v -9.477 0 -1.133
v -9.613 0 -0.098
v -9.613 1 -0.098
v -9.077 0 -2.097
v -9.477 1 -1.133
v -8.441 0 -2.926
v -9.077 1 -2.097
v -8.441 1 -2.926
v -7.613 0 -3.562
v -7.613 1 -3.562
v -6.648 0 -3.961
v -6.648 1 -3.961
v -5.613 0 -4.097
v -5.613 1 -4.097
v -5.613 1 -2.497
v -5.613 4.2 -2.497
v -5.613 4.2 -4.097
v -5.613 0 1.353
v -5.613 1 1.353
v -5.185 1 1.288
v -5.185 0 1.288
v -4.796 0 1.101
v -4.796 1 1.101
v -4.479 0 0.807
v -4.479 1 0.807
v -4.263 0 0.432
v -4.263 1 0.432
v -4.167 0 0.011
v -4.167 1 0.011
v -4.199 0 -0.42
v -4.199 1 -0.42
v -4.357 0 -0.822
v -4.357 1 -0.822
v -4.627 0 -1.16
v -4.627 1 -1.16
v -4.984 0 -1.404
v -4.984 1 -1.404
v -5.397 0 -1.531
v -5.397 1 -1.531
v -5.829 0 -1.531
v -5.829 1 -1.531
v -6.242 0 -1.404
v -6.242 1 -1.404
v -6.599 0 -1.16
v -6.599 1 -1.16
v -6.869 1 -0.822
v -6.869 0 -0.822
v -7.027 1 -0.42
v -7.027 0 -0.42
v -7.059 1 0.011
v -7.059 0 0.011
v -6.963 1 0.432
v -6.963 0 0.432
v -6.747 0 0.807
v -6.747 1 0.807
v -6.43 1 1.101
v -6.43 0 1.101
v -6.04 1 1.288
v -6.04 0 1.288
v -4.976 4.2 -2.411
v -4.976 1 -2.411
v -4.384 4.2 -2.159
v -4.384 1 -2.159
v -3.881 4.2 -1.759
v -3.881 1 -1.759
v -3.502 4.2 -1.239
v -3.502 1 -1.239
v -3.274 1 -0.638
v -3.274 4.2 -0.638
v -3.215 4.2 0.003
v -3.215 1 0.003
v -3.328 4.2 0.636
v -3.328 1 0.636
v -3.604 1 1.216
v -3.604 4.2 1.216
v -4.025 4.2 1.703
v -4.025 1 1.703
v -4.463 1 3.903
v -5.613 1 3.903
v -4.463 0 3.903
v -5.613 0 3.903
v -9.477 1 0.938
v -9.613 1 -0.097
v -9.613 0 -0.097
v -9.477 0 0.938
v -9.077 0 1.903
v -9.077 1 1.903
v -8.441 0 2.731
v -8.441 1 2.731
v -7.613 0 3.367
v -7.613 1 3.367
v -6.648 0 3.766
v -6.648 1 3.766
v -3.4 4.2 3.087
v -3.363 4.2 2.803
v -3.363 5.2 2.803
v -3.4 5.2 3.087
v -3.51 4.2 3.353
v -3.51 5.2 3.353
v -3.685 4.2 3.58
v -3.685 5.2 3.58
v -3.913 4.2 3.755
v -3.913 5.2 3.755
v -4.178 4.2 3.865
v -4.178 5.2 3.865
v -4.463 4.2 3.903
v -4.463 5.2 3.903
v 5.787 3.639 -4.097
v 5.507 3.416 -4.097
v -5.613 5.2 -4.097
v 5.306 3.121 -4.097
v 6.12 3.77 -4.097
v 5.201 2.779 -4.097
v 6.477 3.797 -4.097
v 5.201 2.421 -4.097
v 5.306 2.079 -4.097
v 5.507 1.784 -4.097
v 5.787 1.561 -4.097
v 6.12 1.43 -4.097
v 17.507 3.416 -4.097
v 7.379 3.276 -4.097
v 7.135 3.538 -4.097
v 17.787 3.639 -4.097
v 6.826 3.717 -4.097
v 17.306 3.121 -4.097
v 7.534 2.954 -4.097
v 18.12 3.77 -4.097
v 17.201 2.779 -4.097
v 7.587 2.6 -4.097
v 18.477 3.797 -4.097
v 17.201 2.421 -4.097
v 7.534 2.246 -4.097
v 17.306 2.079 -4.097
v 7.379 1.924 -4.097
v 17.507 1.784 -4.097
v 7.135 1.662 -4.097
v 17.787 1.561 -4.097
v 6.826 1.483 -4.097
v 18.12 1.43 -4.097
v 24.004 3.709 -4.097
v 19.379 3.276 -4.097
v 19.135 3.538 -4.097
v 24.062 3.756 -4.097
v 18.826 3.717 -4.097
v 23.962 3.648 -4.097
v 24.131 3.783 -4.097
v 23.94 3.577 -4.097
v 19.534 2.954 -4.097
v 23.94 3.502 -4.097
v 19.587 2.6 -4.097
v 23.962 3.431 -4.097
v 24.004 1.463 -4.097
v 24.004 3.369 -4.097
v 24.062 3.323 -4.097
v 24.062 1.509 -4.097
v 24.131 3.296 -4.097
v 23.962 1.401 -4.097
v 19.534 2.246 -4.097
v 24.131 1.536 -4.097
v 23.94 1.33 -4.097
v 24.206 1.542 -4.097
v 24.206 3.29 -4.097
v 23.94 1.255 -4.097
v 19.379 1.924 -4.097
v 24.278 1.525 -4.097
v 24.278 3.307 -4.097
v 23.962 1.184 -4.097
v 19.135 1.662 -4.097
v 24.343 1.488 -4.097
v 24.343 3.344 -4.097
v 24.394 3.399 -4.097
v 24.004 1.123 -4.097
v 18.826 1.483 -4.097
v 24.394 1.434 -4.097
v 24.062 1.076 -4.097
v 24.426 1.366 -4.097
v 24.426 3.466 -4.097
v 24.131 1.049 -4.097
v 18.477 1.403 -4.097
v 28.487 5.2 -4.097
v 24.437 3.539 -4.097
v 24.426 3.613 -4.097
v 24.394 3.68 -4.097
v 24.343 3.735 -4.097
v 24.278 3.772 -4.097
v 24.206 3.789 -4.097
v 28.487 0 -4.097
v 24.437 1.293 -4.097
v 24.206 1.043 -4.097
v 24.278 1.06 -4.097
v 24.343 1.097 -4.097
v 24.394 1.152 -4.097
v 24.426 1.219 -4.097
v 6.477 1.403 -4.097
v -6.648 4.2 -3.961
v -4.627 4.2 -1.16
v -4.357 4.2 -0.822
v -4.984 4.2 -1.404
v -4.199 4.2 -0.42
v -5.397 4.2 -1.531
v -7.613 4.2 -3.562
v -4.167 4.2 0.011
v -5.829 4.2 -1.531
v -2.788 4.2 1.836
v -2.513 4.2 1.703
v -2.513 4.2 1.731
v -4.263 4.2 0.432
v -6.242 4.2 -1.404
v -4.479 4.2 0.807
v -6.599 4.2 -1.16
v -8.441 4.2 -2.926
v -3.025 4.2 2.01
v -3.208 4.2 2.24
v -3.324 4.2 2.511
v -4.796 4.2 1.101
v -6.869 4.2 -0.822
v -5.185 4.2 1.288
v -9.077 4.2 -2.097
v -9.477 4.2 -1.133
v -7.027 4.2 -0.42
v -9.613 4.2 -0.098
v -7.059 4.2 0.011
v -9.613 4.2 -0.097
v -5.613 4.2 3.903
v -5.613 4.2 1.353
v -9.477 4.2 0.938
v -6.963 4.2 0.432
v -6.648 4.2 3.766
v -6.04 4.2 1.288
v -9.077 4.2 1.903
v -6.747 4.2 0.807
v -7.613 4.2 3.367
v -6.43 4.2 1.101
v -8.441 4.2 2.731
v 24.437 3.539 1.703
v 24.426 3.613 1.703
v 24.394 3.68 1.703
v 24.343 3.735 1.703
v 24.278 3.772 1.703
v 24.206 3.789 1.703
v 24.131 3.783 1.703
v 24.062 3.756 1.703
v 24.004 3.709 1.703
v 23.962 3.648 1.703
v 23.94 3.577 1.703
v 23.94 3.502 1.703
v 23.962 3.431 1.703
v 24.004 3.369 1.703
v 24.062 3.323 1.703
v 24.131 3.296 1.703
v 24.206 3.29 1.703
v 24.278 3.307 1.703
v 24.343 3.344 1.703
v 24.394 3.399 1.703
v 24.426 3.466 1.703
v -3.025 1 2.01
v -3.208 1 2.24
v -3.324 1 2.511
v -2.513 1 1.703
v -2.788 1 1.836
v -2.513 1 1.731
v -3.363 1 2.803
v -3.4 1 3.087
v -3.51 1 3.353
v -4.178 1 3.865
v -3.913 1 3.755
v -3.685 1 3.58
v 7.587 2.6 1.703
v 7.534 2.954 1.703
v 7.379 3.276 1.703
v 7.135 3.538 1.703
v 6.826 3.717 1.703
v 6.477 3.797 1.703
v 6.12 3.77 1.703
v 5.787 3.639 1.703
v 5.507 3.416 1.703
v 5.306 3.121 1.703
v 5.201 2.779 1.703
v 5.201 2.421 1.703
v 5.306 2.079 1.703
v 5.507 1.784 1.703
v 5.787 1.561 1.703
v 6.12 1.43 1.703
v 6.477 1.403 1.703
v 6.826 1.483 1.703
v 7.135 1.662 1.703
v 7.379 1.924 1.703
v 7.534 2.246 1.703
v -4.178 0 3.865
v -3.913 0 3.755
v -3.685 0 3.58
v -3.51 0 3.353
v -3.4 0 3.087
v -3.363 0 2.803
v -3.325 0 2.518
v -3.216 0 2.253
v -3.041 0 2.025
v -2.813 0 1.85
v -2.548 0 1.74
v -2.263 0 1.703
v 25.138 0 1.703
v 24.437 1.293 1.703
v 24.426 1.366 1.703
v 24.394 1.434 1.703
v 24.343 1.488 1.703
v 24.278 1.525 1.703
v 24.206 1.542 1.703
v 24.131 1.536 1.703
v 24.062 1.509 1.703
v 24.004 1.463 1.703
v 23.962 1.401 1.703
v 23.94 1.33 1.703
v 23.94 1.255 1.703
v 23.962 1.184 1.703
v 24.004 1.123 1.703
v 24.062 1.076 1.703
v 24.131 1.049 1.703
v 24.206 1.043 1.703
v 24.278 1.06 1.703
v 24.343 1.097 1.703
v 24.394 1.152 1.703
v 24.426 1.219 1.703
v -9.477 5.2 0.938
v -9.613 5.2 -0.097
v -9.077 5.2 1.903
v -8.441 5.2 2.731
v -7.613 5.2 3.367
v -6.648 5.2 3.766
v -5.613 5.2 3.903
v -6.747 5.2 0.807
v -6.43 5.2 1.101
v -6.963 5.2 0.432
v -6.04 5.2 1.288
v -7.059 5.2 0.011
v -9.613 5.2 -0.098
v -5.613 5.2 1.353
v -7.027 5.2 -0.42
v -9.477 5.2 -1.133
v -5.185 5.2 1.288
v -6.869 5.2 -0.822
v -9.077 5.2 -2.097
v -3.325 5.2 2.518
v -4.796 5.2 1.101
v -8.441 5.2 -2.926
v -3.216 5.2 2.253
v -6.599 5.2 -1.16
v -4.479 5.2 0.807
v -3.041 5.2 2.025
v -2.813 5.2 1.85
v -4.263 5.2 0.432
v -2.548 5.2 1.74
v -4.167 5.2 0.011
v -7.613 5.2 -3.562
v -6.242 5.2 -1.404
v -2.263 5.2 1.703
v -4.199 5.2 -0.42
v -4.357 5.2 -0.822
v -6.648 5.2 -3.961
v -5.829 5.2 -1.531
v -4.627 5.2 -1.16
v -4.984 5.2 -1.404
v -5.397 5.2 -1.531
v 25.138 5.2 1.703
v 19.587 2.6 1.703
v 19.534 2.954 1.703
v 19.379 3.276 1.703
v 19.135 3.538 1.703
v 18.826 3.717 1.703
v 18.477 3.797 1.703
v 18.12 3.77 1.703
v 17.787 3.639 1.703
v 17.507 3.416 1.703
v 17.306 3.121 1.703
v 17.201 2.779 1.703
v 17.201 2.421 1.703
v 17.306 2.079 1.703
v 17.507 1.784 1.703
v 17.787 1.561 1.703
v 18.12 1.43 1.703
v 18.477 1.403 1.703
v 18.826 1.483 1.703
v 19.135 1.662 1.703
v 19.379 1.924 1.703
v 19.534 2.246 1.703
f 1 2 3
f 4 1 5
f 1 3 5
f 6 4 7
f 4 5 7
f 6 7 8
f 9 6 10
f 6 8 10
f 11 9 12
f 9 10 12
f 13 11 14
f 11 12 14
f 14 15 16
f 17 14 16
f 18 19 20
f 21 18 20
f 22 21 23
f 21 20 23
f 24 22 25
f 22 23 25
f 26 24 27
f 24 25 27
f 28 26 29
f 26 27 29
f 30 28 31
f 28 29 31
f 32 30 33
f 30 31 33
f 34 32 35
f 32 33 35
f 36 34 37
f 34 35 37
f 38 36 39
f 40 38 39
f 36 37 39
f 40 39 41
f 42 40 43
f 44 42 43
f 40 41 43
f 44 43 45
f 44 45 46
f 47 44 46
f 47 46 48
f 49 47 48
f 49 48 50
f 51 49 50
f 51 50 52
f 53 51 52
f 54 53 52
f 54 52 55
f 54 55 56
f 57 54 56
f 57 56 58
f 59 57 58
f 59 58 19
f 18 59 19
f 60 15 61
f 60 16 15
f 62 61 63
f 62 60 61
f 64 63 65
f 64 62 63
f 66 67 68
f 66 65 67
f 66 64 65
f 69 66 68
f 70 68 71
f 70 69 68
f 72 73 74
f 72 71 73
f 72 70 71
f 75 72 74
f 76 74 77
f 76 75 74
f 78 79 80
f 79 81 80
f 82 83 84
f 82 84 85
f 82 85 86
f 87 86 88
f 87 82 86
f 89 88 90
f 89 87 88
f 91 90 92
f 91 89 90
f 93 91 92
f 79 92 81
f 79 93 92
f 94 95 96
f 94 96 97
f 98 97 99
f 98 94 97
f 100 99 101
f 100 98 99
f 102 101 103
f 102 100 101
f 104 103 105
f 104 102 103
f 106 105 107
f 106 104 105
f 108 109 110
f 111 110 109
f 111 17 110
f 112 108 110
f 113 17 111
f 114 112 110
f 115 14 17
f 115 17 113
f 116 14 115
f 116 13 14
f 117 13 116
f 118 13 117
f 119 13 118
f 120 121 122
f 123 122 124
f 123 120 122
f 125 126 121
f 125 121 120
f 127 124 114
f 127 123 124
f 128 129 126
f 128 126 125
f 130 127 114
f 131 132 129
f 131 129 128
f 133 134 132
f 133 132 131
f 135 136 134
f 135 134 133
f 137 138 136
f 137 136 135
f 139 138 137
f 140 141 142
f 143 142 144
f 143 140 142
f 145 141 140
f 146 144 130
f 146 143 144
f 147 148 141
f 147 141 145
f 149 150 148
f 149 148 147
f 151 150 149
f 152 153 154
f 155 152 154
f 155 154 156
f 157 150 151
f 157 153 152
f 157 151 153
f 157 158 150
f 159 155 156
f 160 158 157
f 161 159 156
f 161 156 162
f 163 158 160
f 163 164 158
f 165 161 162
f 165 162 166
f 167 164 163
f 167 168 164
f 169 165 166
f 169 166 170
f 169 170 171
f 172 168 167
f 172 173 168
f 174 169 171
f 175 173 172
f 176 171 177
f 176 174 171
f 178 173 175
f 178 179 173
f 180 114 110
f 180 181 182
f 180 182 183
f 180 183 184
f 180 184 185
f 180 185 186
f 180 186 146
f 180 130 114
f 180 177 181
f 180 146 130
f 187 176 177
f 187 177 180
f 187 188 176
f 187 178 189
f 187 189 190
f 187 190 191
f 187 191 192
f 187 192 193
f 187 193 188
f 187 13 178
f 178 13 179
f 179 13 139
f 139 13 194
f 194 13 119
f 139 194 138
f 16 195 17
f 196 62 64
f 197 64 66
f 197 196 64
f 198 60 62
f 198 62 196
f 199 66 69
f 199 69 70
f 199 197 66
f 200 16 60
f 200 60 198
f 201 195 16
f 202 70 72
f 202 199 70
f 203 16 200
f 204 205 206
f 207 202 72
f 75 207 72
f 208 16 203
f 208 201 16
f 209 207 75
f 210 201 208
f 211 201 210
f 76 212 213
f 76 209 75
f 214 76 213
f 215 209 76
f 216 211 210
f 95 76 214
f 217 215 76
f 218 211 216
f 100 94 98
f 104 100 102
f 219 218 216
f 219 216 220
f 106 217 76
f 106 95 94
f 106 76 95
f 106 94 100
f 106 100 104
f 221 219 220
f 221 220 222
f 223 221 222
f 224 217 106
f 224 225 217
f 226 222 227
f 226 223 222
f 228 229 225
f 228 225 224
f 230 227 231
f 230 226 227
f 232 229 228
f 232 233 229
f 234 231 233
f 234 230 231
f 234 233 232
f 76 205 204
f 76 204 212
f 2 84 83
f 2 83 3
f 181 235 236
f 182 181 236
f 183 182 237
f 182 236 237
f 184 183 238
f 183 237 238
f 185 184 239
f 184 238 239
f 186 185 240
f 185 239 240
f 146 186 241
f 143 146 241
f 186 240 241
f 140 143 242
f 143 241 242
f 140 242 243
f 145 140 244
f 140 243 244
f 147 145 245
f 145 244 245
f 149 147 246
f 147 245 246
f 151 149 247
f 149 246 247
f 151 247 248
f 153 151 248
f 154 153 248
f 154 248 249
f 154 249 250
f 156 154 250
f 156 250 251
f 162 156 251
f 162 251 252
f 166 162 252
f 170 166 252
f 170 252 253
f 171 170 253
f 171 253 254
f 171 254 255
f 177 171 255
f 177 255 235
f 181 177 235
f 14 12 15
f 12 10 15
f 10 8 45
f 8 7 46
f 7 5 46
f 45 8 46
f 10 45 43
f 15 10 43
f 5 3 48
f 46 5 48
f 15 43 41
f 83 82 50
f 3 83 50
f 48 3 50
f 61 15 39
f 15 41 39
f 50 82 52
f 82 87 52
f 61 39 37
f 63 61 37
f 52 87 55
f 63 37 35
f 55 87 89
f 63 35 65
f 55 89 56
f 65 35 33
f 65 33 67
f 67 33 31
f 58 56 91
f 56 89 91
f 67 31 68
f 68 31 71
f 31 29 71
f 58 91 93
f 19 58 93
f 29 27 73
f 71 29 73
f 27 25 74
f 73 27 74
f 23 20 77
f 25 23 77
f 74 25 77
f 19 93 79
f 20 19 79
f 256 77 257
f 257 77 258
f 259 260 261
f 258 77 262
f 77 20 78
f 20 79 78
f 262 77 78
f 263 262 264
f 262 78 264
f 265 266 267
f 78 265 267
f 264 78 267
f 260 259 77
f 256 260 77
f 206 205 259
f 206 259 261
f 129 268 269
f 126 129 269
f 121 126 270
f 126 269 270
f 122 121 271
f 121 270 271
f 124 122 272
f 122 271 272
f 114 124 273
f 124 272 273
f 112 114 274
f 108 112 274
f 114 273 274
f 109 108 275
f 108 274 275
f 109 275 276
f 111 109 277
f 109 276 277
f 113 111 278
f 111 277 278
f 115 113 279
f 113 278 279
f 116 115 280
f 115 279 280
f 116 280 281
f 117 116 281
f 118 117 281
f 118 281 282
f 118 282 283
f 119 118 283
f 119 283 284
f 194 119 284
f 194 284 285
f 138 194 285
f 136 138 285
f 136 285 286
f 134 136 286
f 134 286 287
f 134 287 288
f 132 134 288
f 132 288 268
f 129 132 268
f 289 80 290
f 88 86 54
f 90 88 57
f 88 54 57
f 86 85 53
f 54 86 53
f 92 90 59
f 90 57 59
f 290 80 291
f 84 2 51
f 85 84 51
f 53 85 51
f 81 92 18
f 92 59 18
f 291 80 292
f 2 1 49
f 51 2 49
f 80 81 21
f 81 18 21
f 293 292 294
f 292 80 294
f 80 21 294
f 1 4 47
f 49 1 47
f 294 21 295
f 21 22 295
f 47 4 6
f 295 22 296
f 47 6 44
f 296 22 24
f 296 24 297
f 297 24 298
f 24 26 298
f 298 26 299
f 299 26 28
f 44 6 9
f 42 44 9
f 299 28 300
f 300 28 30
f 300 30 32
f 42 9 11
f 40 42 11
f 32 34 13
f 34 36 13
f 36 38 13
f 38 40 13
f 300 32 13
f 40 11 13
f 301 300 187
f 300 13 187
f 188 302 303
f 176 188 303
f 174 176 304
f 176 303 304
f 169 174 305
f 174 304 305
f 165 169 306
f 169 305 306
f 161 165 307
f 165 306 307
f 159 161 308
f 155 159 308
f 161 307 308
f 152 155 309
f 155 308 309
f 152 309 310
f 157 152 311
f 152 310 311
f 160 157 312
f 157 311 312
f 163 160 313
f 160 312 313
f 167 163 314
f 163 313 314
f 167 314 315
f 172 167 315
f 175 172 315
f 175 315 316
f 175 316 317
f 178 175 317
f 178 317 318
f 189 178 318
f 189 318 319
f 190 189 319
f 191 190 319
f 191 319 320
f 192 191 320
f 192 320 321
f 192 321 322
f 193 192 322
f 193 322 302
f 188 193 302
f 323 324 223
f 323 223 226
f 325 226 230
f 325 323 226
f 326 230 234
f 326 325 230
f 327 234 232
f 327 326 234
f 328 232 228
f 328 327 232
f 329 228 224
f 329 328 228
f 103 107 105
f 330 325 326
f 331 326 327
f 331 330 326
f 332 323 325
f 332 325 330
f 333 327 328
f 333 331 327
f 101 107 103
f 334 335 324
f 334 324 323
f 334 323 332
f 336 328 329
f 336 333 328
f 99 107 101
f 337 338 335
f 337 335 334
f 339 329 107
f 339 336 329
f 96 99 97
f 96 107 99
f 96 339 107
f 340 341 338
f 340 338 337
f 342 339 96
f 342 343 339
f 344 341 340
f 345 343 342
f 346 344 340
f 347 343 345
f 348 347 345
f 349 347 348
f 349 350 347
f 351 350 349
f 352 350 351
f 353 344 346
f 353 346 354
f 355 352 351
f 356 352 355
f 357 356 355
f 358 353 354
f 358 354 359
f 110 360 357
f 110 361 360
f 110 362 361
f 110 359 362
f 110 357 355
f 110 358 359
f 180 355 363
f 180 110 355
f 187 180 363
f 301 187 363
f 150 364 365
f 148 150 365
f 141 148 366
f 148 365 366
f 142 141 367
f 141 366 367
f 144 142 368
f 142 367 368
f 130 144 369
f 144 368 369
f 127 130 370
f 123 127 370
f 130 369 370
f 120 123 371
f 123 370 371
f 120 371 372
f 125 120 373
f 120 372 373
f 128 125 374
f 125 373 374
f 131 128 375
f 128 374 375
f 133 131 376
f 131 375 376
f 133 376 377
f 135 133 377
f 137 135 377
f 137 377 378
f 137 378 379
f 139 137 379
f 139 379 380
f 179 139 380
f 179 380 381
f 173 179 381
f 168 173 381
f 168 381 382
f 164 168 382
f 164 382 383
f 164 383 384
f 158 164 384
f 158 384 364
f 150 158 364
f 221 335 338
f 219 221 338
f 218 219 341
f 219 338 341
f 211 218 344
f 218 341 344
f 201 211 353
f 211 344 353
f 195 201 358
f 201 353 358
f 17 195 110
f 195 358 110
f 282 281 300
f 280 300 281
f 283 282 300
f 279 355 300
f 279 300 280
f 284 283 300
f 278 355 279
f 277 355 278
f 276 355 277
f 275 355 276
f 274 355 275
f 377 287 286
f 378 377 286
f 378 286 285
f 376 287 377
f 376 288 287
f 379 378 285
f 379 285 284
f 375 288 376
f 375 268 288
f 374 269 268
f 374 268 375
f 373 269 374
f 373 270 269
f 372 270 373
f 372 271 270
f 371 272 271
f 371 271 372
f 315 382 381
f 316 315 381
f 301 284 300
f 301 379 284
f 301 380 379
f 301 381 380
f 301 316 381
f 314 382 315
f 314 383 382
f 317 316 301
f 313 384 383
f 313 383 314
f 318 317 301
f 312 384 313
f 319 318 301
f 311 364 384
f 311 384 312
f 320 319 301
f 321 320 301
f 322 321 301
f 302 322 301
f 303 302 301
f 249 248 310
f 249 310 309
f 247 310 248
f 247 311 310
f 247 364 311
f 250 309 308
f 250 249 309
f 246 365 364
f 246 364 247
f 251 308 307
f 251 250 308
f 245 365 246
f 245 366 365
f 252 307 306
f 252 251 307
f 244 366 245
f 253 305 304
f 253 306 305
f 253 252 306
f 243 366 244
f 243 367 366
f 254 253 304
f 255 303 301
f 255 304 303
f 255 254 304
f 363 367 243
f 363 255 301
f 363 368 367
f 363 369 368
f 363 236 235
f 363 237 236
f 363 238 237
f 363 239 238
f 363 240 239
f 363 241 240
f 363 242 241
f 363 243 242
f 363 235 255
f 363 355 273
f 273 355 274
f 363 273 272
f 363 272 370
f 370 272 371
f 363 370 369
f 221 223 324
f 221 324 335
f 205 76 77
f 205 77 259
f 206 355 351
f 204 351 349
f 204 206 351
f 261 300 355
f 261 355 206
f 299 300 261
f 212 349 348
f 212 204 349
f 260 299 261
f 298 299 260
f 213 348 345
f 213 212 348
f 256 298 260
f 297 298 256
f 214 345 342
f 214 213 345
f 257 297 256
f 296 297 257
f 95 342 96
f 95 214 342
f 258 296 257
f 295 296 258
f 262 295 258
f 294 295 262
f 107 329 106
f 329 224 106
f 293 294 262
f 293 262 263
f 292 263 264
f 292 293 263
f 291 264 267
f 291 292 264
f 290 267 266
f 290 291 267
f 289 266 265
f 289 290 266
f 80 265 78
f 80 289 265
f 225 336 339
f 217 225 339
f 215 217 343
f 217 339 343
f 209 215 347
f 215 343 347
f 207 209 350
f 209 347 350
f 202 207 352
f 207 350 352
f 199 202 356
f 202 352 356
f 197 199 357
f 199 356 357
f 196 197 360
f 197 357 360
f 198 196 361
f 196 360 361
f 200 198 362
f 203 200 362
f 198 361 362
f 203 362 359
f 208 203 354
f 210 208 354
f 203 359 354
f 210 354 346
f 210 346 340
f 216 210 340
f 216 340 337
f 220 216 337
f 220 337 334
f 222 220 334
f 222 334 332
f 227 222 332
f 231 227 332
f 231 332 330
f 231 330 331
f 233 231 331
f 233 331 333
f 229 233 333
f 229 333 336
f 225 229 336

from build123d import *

# Parameters (mm, degrees)
SKETCH1_W                  = 38.1
SKETCH1_H                  = 8
BOSS_EXTRUDE1_DEPTH        = 5.2
FILLET1_R                  = 4
SKETCH3_R                  = 1.45
CUT_EXTRUDE1_DEPTH         = 5.2
SKETCH4_W                  = 31.85
SKETCH4_H                  = 2.2
CUT_EXTRUDE2_DEPTH         = 5.2
FILLET2_R                  = 1.1
FILLET3_R                  = 1.1
CUT_EXTRUDE3_DEPTH         = 5.2
CUT_EXTRUDE4_START         = -9.612880748
CUT_EXTRUDE4_OUTLINE_W     = 3.2
CUT_EXTRUDE4_OUTLINE_H     = 11
CUT_EXTRUDE4_DEPTH         = 4
SKETCH8_W                  = 3.1
SKETCH8_H                  = 2.2
CUT_EXTRUDE5_DEPTH         = 3.2
SKETCH9_R                  = 2.4
CUT_EXTRUDE6_DEPTH         = 3.2
M2_CLEARANCE_HOLE1_D       = 2.4
F_0_5_0_5_DIAMETER_HOLE1_D = 0.5


# Read off the part's stored shape, not the designer's step: Cut-Extrude4
with BuildPart() as part:
    # Sketch1 → Boss-Extrude1 (new body)
    with BuildSketch(Plane(origin=(0, 0, 0), x_dir=(1, 0, 0), z_dir=(0, 1, 0))):
        with Locations((9.437119252, 0.097413434)):
            Rectangle(SKETCH1_W, SKETCH1_H)
    extrude(amount=BOSS_EXTRUDE1_DEPTH)

    # Fillet1
    fillet1_edges = [part.edges().sort_by_distance(p)[0] for p in [
        (-9.612880748, 2.6, -4.097413434),
        (-9.612880748, 2.6, 3.902586566),
    ]]
    fillet(fillet1_edges, radius=FILLET1_R - 0.0001)  # a hair under: the kernel refuses the full size

    # Sketch3 → Cut-Extrude1 (cut)
    with BuildSketch(Plane(origin=(0, 5.2, 0), x_dir=(1, 0, 0), z_dir=(0, 1, 0))):
        with Locations(Location((-5.612880748, 0.097413434, 0), (0, 0, 270))):
            Circle(SKETCH3_R)
    extrude(amount=-CUT_EXTRUDE1_DEPTH, mode=Mode.SUBTRACT)

    # Sketch4 → Cut-Extrude2 (cut)
    with BuildSketch(Plane(origin=(0, 5.2, 0), x_dir=(1, 0, 0), z_dir=(0, 1, 0))):
        with Locations((12.562119252, -2.802586566)):
            Rectangle(SKETCH4_W, SKETCH4_H)
    extrude(amount=-CUT_EXTRUDE2_DEPTH, mode=Mode.SUBTRACT)

    # Fillet2
    fillet2_edges = [part.edges().sort_by_distance(p)[0] for p in [
        (-3.362880748, 2.6, 1.702586566),
    ]]
    fillet(fillet2_edges, radius=FILLET2_R)

    # Fillet3
    fillet3_edges = [part.edges().sort_by_distance(p)[0] for p in [
        (-3.362880748, 2.6, 3.902586566),
    ]]
    fillet(fillet3_edges, radius=FILLET3_R - 0.0001)  # a hair under: the kernel refuses the full size

    # Sketch5 → Cut-Extrude3 (cut)
    with BuildSketch(Plane(origin=(0, 5.2, 0), x_dir=(1, 0, 0), z_dir=(0, 1, 0))):
        Polygon((28.487119252, 4.097413434), (25.138487691, -1.702586566), (28.487119252, -1.702586566), align=None)
    extrude(amount=-CUT_EXTRUDE3_DEPTH, mode=Mode.SUBTRACT)

    # Cut-Extrude4 outline → Cut-Extrude4 (cut)
    with BuildSketch(Plane.YZ.offset(CUT_EXTRUDE4_START)):
        with Locations((2.6, -0.5)):
            Rectangle(CUT_EXTRUDE4_OUTLINE_W, CUT_EXTRUDE4_OUTLINE_H)
    extrude(amount=CUT_EXTRUDE4_DEPTH, mode=Mode.SUBTRACT)

    # Sketch8 → Cut-Extrude5 (cut)
    with BuildSketch(Plane.XZ.offset(-4.2)):
        with Locations((-4.062880748, 2.802586566)):
            Rectangle(SKETCH8_W, SKETCH8_H)
    extrude(amount=CUT_EXTRUDE5_DEPTH, mode=Mode.SUBTRACT)

    # Sketch9 → Cut-Extrude6 (cut)
    with BuildSketch(Plane.XZ.offset(-4.2)):
        with Locations((-5.612880748, -0.097413434)):
            Circle(SKETCH9_R)
    extrude(amount=CUT_EXTRUDE6_DEPTH, mode=Mode.SUBTRACT)

    # M2 Clearance Hole1 (through all)
    with Locations(Plane(origin=(6.387119252, 2.6, -4.097413434), x_dir=(-1, 0, 0), z_dir=(0, 0, -1))):
        with Locations((0, 0), (-12, 0)):
            Hole(M2_CLEARANCE_HOLE1_D / 2)

    # Ø0.5 (0.5) Diameter Hole1 (through all)
    with Locations(Plane(origin=(24.187119252, 3.539440359, -4.097413434), x_dir=(-1, 0, 0), z_dir=(0, 0, -1))):
        with Locations((0, 0), (0, -2.246762327)):
            Hole(F_0_5_0_5_DIAMETER_HOLE1_D / 2)


solid = part.part
